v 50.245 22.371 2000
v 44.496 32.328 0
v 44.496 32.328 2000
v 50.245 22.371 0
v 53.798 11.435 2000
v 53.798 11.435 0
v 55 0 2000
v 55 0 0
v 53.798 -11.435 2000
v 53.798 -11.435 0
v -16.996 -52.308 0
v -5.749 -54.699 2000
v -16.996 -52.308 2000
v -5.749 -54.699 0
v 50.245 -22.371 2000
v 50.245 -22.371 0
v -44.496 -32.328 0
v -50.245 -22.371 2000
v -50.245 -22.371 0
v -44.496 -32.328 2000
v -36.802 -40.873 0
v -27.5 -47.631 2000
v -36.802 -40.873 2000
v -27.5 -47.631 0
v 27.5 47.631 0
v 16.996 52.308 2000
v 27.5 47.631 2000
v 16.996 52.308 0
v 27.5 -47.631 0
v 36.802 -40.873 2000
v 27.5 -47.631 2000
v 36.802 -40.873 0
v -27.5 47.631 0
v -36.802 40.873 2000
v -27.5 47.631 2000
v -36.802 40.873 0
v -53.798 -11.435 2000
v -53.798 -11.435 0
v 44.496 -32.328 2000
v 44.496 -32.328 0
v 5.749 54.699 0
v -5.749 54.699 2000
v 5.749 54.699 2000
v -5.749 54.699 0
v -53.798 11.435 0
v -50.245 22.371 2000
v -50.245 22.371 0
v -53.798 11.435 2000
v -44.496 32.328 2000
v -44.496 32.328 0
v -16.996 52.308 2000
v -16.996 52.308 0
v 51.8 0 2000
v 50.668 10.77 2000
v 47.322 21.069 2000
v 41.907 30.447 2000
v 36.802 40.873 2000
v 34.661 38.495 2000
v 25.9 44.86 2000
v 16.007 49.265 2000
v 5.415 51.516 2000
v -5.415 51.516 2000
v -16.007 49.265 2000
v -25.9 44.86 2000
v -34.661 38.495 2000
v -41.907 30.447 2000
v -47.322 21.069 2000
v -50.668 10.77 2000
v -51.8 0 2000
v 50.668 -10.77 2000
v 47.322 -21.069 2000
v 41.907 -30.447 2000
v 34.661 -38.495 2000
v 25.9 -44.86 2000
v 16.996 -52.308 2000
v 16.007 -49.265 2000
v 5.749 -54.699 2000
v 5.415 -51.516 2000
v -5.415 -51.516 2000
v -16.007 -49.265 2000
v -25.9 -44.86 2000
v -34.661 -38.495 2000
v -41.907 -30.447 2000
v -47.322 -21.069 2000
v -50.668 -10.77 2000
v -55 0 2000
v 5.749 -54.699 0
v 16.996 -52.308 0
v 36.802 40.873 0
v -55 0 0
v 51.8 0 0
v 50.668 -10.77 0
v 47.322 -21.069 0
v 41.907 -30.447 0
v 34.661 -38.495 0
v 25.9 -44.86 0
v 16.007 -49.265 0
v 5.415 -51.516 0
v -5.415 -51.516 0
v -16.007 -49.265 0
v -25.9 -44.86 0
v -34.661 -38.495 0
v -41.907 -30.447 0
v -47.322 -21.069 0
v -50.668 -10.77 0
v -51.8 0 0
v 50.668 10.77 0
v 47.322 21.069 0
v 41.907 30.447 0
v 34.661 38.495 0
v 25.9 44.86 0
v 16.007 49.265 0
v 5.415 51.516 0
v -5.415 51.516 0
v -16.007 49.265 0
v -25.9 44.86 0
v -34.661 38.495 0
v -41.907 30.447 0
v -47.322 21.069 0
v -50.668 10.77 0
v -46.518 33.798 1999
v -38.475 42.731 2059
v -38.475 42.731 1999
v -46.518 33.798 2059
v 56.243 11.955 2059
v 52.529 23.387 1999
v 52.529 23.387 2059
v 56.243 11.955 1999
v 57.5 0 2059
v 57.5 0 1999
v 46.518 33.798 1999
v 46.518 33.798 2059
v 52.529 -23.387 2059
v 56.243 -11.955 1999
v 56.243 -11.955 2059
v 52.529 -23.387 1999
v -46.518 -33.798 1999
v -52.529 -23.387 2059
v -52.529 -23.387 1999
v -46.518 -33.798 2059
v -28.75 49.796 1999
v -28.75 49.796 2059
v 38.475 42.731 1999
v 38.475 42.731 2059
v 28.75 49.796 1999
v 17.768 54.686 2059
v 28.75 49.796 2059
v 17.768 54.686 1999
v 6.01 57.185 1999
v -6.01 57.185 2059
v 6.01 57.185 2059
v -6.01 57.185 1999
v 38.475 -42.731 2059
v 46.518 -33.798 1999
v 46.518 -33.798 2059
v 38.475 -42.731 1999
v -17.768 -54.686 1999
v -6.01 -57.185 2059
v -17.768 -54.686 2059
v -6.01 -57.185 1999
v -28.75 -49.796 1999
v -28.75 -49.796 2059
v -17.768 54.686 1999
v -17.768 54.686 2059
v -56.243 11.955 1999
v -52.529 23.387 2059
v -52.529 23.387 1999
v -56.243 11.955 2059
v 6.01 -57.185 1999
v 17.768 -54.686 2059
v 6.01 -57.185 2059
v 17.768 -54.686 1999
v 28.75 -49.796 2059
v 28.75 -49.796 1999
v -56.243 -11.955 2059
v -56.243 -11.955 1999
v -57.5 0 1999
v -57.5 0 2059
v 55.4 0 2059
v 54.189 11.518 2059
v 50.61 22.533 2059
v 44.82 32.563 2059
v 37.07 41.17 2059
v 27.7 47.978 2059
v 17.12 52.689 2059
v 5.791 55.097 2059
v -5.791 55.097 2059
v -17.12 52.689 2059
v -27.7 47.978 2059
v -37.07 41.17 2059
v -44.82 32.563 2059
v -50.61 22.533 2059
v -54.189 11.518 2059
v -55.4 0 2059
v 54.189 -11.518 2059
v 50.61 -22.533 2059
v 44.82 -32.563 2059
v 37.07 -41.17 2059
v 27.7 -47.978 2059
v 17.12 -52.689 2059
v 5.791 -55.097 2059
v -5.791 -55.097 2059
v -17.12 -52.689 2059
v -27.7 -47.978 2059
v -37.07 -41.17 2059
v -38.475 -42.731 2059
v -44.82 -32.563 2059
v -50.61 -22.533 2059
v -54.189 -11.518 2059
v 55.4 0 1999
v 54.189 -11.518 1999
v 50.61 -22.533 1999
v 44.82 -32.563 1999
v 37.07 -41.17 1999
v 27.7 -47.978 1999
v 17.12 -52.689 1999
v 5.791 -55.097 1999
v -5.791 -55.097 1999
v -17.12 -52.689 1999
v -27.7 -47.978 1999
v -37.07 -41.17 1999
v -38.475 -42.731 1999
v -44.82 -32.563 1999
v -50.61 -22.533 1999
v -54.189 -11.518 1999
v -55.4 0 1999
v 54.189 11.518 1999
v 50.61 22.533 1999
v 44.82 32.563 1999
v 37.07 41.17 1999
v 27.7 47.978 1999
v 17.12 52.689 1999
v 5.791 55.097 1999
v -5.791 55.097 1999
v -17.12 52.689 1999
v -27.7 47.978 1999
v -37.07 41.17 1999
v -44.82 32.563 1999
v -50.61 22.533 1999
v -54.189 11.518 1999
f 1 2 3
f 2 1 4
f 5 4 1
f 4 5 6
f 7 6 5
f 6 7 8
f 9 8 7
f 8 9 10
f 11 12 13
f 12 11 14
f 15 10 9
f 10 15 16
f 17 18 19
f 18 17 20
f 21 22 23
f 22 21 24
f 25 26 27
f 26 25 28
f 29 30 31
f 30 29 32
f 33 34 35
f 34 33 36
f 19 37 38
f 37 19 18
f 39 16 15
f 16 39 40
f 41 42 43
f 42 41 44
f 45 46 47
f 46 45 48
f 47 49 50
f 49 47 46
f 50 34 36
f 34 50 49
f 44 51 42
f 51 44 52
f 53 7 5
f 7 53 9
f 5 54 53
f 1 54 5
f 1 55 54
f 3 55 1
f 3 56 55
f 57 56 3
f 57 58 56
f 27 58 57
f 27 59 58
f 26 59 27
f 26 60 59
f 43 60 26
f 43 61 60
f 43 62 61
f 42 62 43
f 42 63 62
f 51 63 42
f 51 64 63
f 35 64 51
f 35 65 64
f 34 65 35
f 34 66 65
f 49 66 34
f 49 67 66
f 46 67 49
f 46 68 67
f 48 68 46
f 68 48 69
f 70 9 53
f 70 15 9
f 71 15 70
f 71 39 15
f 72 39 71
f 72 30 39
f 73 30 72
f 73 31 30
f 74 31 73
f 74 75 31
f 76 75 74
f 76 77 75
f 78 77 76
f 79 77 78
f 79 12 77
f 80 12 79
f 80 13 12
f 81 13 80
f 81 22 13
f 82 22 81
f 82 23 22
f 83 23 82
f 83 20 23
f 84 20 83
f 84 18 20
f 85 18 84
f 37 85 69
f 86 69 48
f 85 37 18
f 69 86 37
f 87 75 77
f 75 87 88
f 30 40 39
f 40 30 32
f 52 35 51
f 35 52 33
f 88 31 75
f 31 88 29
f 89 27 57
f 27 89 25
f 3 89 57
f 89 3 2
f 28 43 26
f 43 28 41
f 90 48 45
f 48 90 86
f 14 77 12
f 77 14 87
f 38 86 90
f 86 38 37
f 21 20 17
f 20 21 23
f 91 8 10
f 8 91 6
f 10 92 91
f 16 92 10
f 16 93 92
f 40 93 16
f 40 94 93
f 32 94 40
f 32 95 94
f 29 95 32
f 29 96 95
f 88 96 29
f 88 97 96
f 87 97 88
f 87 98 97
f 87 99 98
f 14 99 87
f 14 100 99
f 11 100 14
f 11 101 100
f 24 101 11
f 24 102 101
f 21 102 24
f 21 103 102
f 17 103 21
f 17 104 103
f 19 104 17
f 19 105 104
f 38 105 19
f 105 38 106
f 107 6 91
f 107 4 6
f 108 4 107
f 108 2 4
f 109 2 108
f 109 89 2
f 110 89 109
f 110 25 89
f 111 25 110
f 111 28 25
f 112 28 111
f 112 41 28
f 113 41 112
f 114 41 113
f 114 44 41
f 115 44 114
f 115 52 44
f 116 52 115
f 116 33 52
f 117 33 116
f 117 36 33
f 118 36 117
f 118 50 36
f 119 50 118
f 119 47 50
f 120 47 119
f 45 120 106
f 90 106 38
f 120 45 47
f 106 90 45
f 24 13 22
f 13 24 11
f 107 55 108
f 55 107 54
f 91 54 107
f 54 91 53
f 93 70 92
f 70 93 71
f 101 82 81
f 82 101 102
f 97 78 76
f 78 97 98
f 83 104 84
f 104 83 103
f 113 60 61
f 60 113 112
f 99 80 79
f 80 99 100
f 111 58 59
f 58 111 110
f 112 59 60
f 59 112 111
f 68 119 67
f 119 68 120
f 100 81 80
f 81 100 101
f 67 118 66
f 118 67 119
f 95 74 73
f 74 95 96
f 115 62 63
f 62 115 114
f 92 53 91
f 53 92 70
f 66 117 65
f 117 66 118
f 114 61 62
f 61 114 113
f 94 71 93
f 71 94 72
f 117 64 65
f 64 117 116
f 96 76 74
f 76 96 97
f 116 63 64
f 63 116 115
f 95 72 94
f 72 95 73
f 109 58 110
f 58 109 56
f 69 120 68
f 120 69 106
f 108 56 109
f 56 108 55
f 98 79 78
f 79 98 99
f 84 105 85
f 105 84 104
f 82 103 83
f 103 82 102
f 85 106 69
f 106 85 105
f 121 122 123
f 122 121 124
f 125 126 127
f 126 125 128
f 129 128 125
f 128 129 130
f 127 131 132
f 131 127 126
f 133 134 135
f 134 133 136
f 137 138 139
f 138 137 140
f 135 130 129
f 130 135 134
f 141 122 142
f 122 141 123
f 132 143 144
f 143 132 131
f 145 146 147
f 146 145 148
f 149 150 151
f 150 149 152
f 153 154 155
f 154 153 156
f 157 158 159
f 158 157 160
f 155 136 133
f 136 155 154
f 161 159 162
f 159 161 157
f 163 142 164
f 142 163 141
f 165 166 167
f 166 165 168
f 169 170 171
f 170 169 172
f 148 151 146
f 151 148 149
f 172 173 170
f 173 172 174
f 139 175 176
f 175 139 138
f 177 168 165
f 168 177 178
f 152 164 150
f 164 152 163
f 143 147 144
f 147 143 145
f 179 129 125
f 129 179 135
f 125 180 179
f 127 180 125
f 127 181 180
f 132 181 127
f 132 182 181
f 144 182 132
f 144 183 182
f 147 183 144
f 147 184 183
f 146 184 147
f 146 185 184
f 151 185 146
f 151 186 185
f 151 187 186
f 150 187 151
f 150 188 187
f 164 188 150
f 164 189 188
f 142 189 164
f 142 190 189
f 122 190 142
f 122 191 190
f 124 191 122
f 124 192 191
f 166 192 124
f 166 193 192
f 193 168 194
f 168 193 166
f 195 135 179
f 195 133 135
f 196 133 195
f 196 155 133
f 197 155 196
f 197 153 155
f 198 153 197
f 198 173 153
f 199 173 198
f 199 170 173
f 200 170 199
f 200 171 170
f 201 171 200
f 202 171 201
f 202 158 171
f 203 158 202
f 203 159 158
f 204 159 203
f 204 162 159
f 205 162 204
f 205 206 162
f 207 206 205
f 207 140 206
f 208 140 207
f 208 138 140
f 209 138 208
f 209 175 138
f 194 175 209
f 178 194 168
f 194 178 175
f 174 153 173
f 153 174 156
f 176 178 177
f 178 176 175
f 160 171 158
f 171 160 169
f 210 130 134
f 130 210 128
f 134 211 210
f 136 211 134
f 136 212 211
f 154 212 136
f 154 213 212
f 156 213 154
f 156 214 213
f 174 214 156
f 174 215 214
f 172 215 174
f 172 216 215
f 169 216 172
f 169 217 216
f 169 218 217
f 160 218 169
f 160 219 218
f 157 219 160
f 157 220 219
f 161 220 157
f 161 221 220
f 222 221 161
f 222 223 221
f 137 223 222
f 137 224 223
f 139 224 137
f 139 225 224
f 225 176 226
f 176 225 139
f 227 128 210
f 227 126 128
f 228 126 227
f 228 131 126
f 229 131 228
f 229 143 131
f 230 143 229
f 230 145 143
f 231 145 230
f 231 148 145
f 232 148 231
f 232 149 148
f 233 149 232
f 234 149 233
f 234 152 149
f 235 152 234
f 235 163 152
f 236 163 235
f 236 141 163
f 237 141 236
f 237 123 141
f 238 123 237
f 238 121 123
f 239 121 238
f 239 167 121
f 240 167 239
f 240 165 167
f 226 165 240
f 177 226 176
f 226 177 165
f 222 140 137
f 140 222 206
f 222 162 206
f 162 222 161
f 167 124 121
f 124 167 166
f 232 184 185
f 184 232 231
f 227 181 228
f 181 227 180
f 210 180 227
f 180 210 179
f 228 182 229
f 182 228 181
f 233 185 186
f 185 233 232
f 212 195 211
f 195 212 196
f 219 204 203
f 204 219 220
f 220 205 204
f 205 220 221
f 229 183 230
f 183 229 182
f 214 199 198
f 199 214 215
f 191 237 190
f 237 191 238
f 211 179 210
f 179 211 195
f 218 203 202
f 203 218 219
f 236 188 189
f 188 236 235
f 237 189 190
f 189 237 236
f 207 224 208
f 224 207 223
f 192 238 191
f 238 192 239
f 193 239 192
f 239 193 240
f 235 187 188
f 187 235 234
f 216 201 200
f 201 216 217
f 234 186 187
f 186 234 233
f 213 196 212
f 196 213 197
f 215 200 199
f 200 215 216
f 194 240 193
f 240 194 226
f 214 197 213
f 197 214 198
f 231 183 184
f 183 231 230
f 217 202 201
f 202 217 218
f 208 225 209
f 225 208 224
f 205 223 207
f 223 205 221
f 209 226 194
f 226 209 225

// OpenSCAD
// Parameters
pipe_standard = 1; //[1:1:1]
nominal_diameter_mm = 110; //[55:220:1]
length_mm = 2000; //[1000:4000:10]
pipe_wall_mm = 3.2; //[1.6:6.4:0.1]
socket_length_mm = 60; //[30:120:1]
socket_wall_extra_mm = 2.5; //[1.0:6.0:0.1]
socket_overlap_mm = 1; //[0.5:2:0.1]
clearance_mm = 0.4; //[0.1:1.0:0.1]

// HT Pipe - complete geometry
module ht_pipe() {
  color([0.85, 0.85, 0.8]) {
    // Pipe Body
    difference() {
      cylinder(h=length_mm, r=nominal_diameter_mm/2, center=false);
      translate([0, 0, 0])
        cylinder(h=length_mm, r=nominal_diameter_mm/2 - pipe_wall_mm, center=false);
    }
    
    // End Fitting Socket
    difference() {
      translate([0, 0, length_mm - socket_overlap_mm])
        cylinder(h=socket_length_mm, r=nominal_diameter_mm/2 + socket_wall_extra_mm, center=false);
      translate([0, 0, length_mm - socket_overlap_mm])
        cylinder(h=socket_length_mm, r=nominal_diameter_mm/2 + clearance_mm, center=false);
    }
  }
}

// Assembly
module assembly() {
  ht_pipe();
}

assembly();
